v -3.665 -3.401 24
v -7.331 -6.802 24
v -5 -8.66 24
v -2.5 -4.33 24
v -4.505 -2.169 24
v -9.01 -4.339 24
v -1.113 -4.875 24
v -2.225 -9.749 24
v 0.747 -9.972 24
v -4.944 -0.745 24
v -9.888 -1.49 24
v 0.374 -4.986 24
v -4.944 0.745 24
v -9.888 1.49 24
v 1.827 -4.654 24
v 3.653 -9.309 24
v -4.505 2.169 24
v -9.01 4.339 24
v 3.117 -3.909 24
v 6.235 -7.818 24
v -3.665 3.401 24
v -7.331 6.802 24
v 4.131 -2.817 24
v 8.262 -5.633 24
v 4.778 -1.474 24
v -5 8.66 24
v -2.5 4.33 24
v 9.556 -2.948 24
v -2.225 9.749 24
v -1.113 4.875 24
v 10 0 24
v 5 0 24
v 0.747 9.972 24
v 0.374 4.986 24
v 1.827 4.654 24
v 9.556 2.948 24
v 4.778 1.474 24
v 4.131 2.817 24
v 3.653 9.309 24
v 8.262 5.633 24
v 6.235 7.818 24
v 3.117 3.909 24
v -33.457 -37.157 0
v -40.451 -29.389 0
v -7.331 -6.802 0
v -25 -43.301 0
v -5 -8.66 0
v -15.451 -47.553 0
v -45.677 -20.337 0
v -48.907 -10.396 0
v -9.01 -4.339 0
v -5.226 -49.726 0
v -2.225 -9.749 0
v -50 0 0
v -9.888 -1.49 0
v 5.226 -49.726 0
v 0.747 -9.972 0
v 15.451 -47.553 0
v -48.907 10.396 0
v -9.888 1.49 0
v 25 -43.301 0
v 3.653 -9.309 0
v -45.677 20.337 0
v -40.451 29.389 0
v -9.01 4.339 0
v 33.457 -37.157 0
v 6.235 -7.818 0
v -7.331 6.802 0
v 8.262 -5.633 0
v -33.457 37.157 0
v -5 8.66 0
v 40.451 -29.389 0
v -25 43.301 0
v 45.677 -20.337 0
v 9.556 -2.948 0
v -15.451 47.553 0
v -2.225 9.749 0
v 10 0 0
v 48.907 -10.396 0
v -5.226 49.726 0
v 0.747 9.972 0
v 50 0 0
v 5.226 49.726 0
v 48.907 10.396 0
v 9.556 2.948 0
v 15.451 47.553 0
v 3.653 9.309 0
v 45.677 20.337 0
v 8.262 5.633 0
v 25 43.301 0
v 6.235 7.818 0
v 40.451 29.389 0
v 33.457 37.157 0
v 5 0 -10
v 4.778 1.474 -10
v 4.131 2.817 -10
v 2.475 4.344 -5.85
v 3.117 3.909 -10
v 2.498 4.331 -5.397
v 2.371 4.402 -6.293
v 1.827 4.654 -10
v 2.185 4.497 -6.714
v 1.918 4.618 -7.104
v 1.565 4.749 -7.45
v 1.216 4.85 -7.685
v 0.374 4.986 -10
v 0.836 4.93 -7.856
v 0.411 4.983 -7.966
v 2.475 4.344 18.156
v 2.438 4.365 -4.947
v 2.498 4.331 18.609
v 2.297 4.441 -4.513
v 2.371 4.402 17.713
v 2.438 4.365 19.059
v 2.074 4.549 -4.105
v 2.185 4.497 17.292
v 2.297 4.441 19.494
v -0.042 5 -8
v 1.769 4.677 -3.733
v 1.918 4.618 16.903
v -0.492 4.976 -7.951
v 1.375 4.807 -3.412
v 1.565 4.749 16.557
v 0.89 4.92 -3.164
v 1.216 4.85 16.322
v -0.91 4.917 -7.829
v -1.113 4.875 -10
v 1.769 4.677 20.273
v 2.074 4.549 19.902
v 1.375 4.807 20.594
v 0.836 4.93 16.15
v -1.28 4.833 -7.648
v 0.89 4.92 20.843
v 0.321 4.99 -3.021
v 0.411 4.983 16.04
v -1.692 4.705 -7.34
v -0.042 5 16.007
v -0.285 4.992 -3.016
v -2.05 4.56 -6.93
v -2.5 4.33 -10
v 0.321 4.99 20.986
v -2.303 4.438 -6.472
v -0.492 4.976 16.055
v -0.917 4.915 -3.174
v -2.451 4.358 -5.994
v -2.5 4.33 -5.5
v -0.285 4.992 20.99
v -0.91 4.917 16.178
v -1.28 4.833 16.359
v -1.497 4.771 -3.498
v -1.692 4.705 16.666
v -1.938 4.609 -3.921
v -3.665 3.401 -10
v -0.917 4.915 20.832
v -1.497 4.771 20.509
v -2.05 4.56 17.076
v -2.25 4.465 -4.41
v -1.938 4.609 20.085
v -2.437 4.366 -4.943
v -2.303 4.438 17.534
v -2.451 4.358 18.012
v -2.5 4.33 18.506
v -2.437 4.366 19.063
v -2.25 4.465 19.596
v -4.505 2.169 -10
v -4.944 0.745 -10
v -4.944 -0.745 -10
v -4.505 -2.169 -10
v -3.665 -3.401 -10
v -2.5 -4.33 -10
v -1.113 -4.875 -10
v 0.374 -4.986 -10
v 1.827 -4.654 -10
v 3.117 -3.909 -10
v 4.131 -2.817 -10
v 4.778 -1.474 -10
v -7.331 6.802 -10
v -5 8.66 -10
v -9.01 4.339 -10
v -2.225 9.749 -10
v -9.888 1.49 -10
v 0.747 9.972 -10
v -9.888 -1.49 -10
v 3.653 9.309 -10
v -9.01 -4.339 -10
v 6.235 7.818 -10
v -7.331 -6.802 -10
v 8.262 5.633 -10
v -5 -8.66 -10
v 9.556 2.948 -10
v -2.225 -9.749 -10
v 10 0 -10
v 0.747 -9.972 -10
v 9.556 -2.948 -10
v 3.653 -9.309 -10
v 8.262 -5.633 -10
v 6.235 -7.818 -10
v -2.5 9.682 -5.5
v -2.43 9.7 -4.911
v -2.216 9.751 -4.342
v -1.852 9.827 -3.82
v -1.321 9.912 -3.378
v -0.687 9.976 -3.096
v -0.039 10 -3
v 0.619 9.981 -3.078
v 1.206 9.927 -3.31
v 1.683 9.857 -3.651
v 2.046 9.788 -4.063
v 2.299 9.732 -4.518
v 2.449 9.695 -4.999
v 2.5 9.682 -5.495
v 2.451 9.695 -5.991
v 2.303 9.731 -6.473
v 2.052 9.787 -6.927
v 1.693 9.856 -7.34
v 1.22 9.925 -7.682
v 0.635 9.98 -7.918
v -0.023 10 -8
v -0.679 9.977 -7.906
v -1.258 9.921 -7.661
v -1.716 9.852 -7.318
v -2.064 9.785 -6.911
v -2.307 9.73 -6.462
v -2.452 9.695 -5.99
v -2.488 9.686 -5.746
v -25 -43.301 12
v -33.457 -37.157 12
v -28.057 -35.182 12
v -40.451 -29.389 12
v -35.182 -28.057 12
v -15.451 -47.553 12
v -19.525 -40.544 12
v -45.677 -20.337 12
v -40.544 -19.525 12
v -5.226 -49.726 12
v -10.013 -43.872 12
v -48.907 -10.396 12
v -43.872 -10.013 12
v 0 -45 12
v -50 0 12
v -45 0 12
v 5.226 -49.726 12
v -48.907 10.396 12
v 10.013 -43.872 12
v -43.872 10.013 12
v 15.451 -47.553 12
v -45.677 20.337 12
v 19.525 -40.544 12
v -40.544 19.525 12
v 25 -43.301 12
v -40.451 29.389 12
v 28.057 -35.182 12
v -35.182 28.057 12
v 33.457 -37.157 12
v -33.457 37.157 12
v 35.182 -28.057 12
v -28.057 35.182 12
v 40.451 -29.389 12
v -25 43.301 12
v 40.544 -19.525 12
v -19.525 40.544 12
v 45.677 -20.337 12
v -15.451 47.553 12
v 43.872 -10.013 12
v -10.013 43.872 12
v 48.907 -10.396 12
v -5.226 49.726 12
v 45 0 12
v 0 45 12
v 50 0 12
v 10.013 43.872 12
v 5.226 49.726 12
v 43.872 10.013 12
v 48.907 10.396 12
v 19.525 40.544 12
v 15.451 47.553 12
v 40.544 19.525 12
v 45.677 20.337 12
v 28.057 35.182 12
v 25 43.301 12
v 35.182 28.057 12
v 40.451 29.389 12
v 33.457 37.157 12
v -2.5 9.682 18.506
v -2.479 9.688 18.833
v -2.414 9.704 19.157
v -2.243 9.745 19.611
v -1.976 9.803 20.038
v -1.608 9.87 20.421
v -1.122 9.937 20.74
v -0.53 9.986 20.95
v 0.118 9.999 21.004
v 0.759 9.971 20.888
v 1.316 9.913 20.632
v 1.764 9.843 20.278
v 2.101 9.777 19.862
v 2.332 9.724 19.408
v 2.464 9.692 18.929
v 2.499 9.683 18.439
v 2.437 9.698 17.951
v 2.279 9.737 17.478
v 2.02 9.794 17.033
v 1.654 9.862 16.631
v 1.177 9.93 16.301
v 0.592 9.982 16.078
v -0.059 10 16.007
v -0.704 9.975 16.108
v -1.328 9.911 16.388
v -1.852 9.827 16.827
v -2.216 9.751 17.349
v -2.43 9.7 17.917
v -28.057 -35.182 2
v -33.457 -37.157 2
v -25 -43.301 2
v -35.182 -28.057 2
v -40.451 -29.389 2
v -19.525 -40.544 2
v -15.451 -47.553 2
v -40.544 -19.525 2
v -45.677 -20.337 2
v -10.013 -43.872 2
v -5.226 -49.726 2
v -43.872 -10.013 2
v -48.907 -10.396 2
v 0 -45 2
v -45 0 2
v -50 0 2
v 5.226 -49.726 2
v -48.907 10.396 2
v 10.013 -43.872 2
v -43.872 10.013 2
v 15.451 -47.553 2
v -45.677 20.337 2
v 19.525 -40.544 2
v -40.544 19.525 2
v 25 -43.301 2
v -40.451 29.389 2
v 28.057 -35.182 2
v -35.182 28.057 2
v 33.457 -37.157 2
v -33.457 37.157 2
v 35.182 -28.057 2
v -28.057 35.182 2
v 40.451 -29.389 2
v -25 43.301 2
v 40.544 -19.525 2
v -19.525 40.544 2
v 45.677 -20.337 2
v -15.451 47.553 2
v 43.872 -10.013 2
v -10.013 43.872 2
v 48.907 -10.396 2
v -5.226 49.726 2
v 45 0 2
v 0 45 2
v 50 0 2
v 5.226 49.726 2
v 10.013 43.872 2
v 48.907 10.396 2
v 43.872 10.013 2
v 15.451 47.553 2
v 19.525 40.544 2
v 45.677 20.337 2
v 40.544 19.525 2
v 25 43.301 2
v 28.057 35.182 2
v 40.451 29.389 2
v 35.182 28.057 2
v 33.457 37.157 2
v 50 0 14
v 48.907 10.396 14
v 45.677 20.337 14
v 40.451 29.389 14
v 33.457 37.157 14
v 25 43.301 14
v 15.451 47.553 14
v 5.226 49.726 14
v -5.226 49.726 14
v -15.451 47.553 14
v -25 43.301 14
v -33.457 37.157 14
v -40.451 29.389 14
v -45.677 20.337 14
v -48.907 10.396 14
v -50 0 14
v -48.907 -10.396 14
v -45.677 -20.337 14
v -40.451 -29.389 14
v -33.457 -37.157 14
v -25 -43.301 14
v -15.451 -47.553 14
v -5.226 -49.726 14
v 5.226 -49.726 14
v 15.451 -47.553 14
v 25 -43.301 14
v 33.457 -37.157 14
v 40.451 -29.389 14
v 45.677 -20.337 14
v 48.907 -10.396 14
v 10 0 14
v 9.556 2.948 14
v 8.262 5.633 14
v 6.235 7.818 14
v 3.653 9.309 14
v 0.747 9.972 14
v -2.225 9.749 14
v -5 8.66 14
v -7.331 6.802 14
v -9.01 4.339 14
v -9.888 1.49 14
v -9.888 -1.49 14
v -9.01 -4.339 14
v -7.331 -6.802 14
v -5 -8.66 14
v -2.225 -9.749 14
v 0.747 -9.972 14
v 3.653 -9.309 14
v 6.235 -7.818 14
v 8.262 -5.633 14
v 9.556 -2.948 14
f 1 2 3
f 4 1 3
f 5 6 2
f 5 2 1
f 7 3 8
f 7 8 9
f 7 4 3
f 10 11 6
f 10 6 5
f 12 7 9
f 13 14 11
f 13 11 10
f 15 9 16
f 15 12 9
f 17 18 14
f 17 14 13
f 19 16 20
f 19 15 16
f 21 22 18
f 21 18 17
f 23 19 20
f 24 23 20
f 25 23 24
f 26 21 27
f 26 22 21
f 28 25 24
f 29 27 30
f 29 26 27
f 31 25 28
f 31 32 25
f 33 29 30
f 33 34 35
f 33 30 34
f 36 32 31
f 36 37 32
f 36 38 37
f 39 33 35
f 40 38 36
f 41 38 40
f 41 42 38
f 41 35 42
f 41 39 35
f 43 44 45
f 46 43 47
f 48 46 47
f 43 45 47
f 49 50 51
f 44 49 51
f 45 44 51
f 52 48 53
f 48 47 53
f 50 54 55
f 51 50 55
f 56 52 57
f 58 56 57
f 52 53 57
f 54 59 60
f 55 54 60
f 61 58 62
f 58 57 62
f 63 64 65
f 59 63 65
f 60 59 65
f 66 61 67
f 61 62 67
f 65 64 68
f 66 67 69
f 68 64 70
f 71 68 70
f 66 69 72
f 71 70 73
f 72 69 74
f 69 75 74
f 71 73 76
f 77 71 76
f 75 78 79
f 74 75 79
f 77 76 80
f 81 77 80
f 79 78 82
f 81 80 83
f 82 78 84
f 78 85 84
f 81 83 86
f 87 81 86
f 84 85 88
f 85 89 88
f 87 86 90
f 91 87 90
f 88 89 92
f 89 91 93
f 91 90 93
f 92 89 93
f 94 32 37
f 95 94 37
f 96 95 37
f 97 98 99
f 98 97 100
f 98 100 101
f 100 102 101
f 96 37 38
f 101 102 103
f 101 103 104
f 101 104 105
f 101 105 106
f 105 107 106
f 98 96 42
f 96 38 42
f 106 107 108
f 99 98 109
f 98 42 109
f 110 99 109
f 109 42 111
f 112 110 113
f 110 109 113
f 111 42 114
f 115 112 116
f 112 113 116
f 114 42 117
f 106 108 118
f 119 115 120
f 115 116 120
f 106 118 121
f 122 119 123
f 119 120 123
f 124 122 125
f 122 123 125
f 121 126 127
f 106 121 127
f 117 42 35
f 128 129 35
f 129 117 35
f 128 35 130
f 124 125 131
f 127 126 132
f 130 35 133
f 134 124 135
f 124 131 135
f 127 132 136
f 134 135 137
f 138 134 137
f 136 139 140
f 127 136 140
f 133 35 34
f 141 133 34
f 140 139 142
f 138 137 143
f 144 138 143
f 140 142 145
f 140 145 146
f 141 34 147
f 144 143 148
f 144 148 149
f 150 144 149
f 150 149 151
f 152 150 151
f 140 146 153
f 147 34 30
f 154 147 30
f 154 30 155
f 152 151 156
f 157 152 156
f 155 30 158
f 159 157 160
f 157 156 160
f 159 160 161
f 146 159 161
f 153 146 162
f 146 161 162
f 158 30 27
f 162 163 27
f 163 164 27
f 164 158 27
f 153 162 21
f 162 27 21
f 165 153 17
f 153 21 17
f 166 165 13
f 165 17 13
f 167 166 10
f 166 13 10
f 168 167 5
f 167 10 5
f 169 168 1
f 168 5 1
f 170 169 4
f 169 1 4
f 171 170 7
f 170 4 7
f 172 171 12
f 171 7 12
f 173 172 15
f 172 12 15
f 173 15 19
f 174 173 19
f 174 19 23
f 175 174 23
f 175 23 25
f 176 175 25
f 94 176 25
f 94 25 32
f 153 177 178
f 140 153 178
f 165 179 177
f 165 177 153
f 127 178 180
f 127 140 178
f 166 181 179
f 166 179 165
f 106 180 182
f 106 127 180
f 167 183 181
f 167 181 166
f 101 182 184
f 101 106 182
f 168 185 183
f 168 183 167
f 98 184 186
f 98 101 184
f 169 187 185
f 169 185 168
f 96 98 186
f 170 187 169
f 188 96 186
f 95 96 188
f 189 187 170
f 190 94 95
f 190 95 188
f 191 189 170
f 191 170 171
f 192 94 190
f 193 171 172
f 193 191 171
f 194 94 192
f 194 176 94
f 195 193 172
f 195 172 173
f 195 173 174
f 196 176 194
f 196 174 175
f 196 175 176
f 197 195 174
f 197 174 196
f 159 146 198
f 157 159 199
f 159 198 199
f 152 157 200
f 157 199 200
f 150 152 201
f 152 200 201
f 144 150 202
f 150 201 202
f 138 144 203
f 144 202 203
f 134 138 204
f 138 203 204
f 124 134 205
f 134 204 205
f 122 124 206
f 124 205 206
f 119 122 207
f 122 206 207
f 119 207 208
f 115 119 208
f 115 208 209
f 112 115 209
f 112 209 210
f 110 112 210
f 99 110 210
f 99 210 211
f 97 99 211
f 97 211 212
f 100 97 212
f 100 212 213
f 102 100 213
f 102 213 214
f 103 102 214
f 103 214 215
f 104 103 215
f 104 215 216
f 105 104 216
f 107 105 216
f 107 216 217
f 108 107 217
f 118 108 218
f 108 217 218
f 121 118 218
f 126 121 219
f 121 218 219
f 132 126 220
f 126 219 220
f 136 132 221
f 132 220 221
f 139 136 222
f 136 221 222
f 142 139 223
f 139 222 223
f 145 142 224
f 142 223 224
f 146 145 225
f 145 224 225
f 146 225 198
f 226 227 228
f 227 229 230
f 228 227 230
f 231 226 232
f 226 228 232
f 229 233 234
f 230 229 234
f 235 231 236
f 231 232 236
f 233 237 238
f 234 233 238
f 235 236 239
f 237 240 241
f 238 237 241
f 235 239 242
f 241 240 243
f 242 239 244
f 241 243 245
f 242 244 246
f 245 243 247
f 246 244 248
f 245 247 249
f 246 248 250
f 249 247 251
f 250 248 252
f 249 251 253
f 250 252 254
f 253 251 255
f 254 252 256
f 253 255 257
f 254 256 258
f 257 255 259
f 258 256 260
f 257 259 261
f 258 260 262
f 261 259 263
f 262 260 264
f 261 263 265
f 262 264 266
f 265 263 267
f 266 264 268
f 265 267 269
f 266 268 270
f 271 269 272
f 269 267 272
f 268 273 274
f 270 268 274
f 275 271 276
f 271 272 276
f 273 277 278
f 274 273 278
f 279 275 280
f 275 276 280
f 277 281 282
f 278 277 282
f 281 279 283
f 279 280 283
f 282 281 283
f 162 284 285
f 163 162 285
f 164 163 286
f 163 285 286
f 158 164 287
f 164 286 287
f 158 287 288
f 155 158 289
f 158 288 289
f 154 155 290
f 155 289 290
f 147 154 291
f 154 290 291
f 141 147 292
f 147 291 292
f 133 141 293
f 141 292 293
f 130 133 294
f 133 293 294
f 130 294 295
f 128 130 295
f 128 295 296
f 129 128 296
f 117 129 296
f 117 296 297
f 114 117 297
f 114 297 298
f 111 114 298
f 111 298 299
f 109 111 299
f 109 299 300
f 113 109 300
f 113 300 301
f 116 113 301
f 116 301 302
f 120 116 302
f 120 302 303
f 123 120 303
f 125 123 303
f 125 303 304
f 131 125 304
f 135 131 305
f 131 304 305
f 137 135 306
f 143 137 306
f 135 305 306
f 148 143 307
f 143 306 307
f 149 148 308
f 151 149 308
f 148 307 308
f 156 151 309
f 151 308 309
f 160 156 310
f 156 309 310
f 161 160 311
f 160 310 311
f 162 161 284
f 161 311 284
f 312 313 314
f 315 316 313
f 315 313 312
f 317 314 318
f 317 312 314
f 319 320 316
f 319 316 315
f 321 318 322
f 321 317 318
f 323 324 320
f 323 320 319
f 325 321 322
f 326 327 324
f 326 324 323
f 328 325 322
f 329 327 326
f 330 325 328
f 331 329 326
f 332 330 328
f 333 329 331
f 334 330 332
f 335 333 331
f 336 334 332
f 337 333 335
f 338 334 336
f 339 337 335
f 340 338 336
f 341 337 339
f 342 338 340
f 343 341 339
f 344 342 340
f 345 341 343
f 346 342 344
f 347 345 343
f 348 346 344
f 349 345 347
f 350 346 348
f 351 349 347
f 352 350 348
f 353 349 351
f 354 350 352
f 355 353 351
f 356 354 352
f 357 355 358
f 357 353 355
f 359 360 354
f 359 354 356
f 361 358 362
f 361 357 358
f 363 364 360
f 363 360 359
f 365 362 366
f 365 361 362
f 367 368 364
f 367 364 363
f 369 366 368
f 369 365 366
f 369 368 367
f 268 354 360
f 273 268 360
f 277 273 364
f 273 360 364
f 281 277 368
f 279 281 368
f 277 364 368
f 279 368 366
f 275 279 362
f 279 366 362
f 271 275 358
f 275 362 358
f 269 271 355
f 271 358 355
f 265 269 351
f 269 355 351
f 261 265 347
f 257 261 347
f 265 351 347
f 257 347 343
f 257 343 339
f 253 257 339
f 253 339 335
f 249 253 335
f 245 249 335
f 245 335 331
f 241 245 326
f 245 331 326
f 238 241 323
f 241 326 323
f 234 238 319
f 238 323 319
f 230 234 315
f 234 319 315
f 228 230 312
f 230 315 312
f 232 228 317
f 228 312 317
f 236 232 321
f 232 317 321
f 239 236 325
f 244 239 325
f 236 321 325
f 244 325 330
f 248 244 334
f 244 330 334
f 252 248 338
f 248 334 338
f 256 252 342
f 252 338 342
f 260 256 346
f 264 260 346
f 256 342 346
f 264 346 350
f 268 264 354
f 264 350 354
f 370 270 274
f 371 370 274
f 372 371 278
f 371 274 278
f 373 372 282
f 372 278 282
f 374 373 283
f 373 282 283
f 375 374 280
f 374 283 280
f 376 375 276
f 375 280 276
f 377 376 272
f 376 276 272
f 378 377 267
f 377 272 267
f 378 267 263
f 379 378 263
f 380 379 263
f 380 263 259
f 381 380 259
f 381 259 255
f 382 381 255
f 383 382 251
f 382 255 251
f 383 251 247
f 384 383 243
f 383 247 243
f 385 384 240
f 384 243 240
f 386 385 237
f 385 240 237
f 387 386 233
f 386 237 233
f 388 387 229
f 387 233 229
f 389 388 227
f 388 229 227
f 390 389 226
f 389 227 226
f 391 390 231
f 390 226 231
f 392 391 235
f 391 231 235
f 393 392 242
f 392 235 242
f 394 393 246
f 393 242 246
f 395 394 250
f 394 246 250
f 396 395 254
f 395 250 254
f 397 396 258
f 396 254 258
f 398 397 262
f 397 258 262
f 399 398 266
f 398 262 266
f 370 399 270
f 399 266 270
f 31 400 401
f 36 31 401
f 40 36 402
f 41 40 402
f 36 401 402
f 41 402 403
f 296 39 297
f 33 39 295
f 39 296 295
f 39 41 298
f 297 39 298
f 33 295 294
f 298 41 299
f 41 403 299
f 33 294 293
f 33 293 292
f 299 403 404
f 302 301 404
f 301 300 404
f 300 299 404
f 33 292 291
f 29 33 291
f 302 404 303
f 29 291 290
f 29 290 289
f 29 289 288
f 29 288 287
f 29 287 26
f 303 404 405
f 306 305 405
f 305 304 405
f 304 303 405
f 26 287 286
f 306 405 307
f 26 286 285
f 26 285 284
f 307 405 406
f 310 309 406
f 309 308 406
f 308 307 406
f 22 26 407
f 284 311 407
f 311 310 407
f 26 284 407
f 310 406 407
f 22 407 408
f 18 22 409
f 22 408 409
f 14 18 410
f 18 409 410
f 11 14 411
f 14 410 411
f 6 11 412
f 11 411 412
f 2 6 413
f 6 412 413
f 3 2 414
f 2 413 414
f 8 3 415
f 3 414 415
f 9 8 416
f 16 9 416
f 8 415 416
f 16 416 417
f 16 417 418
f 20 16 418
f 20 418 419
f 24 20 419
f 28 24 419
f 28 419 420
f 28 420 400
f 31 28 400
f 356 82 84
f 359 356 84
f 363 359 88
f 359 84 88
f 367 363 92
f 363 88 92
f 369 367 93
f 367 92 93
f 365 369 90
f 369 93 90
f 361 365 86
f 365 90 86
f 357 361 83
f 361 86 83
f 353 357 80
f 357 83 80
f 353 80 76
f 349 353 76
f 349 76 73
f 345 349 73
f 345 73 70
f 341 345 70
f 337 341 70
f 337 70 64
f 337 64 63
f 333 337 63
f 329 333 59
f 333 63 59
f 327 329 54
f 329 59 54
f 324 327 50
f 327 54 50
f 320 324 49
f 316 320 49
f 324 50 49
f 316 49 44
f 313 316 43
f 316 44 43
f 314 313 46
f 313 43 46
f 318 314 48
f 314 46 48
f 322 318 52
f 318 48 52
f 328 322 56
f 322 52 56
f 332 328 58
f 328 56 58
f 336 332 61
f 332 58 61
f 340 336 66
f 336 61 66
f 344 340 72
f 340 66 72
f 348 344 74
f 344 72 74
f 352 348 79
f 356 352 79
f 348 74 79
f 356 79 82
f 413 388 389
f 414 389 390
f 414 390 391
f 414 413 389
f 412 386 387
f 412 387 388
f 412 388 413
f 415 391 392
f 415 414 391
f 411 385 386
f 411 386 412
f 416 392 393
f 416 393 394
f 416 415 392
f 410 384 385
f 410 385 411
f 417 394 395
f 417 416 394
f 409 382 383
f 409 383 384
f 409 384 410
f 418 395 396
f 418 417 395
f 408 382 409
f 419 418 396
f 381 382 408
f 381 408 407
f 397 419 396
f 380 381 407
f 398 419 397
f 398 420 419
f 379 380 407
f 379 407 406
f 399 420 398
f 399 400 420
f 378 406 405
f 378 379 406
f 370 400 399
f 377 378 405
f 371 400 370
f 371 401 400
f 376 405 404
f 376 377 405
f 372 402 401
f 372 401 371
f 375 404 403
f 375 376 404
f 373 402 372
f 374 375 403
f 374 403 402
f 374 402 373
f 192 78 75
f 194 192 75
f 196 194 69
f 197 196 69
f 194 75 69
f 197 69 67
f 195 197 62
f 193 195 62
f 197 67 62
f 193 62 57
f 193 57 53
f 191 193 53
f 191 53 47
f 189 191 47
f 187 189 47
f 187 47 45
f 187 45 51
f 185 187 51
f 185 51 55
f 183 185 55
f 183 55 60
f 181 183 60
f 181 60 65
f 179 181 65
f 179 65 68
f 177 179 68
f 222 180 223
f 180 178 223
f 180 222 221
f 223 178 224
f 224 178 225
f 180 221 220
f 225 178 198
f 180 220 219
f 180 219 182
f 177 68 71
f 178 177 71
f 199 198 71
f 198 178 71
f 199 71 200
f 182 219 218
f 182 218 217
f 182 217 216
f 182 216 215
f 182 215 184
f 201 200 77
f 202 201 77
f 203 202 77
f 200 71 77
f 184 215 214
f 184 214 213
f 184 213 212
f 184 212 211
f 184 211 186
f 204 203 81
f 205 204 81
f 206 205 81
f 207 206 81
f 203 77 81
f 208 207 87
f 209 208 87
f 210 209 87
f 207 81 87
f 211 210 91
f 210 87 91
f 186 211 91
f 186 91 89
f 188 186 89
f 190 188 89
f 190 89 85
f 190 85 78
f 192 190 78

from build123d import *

# Parameters (mm, degrees)
F0_R      = 50
F1_DEPTH  = 2
F2_R      = 45
F3_DEPTH  = 10
F4_R      = 50
F4_R_2    = 45
F5_DEPTH  = 2
F6_R      = 10
F7_DEPTH  = 10
F8_R      = 10
F9_DEPTH  = 10
F10_R     = 5
F11_DEPTH = 34.001
F14_R     = 2.5
F15_DEPTH = 6.6698730813


with BuildPart() as f1:
    # F0 (on Top) → F1 (new body)
    with BuildSketch(Plane.XY):
        Circle(F0_R)
    extrude(amount=F1_DEPTH)

    # F2 (on face) → F3 (join)
    with BuildSketch(Plane.XY.offset(2)):
        Circle(F2_R)
    extrude(amount=F3_DEPTH)

    # F4 (on face) → F5 (join)
    with BuildSketch(Plane.XY.offset(12)):
        Circle(F4_R)
        Circle(F4_R_2, mode=Mode.SUBTRACT)
        Circle(F4_R_2)
    extrude(amount=F5_DEPTH)

    # F6 (on face) → F7 (join)
    with BuildSketch(Plane.XY.offset(14)):
        Circle(F6_R)
    extrude(amount=F7_DEPTH)

    # F8 (on face) → F9 (join)
    with BuildSketch(Plane(origin=(0, 0, 0), x_dir=(1, 0, 0), z_dir=(0, 0, -1))):
        Circle(F8_R)
    extrude(amount=F9_DEPTH)

    # F10 (on face) → F11 (cut, through all)
    with BuildSketch(Plane.XY.offset(24)):
        Circle(F10_R)
    extrude(amount=-F11_DEPTH, mode=Mode.SUBTRACT)

    # F14 (on face) → F15 (cut, up to face)
    with BuildSketch(Plane(origin=(0, 10, 0), x_dir=(-1, 0, 0), z_dir=(0, 1, 0))):
        with Locations((0, 18.5063882234)):
            Circle(F14_R)
        with Locations((0, -5.5)):
            Circle(F14_R)
    extrude(amount=-F15_DEPTH, mode=Mode.SUBTRACT)


solid = f1.part
